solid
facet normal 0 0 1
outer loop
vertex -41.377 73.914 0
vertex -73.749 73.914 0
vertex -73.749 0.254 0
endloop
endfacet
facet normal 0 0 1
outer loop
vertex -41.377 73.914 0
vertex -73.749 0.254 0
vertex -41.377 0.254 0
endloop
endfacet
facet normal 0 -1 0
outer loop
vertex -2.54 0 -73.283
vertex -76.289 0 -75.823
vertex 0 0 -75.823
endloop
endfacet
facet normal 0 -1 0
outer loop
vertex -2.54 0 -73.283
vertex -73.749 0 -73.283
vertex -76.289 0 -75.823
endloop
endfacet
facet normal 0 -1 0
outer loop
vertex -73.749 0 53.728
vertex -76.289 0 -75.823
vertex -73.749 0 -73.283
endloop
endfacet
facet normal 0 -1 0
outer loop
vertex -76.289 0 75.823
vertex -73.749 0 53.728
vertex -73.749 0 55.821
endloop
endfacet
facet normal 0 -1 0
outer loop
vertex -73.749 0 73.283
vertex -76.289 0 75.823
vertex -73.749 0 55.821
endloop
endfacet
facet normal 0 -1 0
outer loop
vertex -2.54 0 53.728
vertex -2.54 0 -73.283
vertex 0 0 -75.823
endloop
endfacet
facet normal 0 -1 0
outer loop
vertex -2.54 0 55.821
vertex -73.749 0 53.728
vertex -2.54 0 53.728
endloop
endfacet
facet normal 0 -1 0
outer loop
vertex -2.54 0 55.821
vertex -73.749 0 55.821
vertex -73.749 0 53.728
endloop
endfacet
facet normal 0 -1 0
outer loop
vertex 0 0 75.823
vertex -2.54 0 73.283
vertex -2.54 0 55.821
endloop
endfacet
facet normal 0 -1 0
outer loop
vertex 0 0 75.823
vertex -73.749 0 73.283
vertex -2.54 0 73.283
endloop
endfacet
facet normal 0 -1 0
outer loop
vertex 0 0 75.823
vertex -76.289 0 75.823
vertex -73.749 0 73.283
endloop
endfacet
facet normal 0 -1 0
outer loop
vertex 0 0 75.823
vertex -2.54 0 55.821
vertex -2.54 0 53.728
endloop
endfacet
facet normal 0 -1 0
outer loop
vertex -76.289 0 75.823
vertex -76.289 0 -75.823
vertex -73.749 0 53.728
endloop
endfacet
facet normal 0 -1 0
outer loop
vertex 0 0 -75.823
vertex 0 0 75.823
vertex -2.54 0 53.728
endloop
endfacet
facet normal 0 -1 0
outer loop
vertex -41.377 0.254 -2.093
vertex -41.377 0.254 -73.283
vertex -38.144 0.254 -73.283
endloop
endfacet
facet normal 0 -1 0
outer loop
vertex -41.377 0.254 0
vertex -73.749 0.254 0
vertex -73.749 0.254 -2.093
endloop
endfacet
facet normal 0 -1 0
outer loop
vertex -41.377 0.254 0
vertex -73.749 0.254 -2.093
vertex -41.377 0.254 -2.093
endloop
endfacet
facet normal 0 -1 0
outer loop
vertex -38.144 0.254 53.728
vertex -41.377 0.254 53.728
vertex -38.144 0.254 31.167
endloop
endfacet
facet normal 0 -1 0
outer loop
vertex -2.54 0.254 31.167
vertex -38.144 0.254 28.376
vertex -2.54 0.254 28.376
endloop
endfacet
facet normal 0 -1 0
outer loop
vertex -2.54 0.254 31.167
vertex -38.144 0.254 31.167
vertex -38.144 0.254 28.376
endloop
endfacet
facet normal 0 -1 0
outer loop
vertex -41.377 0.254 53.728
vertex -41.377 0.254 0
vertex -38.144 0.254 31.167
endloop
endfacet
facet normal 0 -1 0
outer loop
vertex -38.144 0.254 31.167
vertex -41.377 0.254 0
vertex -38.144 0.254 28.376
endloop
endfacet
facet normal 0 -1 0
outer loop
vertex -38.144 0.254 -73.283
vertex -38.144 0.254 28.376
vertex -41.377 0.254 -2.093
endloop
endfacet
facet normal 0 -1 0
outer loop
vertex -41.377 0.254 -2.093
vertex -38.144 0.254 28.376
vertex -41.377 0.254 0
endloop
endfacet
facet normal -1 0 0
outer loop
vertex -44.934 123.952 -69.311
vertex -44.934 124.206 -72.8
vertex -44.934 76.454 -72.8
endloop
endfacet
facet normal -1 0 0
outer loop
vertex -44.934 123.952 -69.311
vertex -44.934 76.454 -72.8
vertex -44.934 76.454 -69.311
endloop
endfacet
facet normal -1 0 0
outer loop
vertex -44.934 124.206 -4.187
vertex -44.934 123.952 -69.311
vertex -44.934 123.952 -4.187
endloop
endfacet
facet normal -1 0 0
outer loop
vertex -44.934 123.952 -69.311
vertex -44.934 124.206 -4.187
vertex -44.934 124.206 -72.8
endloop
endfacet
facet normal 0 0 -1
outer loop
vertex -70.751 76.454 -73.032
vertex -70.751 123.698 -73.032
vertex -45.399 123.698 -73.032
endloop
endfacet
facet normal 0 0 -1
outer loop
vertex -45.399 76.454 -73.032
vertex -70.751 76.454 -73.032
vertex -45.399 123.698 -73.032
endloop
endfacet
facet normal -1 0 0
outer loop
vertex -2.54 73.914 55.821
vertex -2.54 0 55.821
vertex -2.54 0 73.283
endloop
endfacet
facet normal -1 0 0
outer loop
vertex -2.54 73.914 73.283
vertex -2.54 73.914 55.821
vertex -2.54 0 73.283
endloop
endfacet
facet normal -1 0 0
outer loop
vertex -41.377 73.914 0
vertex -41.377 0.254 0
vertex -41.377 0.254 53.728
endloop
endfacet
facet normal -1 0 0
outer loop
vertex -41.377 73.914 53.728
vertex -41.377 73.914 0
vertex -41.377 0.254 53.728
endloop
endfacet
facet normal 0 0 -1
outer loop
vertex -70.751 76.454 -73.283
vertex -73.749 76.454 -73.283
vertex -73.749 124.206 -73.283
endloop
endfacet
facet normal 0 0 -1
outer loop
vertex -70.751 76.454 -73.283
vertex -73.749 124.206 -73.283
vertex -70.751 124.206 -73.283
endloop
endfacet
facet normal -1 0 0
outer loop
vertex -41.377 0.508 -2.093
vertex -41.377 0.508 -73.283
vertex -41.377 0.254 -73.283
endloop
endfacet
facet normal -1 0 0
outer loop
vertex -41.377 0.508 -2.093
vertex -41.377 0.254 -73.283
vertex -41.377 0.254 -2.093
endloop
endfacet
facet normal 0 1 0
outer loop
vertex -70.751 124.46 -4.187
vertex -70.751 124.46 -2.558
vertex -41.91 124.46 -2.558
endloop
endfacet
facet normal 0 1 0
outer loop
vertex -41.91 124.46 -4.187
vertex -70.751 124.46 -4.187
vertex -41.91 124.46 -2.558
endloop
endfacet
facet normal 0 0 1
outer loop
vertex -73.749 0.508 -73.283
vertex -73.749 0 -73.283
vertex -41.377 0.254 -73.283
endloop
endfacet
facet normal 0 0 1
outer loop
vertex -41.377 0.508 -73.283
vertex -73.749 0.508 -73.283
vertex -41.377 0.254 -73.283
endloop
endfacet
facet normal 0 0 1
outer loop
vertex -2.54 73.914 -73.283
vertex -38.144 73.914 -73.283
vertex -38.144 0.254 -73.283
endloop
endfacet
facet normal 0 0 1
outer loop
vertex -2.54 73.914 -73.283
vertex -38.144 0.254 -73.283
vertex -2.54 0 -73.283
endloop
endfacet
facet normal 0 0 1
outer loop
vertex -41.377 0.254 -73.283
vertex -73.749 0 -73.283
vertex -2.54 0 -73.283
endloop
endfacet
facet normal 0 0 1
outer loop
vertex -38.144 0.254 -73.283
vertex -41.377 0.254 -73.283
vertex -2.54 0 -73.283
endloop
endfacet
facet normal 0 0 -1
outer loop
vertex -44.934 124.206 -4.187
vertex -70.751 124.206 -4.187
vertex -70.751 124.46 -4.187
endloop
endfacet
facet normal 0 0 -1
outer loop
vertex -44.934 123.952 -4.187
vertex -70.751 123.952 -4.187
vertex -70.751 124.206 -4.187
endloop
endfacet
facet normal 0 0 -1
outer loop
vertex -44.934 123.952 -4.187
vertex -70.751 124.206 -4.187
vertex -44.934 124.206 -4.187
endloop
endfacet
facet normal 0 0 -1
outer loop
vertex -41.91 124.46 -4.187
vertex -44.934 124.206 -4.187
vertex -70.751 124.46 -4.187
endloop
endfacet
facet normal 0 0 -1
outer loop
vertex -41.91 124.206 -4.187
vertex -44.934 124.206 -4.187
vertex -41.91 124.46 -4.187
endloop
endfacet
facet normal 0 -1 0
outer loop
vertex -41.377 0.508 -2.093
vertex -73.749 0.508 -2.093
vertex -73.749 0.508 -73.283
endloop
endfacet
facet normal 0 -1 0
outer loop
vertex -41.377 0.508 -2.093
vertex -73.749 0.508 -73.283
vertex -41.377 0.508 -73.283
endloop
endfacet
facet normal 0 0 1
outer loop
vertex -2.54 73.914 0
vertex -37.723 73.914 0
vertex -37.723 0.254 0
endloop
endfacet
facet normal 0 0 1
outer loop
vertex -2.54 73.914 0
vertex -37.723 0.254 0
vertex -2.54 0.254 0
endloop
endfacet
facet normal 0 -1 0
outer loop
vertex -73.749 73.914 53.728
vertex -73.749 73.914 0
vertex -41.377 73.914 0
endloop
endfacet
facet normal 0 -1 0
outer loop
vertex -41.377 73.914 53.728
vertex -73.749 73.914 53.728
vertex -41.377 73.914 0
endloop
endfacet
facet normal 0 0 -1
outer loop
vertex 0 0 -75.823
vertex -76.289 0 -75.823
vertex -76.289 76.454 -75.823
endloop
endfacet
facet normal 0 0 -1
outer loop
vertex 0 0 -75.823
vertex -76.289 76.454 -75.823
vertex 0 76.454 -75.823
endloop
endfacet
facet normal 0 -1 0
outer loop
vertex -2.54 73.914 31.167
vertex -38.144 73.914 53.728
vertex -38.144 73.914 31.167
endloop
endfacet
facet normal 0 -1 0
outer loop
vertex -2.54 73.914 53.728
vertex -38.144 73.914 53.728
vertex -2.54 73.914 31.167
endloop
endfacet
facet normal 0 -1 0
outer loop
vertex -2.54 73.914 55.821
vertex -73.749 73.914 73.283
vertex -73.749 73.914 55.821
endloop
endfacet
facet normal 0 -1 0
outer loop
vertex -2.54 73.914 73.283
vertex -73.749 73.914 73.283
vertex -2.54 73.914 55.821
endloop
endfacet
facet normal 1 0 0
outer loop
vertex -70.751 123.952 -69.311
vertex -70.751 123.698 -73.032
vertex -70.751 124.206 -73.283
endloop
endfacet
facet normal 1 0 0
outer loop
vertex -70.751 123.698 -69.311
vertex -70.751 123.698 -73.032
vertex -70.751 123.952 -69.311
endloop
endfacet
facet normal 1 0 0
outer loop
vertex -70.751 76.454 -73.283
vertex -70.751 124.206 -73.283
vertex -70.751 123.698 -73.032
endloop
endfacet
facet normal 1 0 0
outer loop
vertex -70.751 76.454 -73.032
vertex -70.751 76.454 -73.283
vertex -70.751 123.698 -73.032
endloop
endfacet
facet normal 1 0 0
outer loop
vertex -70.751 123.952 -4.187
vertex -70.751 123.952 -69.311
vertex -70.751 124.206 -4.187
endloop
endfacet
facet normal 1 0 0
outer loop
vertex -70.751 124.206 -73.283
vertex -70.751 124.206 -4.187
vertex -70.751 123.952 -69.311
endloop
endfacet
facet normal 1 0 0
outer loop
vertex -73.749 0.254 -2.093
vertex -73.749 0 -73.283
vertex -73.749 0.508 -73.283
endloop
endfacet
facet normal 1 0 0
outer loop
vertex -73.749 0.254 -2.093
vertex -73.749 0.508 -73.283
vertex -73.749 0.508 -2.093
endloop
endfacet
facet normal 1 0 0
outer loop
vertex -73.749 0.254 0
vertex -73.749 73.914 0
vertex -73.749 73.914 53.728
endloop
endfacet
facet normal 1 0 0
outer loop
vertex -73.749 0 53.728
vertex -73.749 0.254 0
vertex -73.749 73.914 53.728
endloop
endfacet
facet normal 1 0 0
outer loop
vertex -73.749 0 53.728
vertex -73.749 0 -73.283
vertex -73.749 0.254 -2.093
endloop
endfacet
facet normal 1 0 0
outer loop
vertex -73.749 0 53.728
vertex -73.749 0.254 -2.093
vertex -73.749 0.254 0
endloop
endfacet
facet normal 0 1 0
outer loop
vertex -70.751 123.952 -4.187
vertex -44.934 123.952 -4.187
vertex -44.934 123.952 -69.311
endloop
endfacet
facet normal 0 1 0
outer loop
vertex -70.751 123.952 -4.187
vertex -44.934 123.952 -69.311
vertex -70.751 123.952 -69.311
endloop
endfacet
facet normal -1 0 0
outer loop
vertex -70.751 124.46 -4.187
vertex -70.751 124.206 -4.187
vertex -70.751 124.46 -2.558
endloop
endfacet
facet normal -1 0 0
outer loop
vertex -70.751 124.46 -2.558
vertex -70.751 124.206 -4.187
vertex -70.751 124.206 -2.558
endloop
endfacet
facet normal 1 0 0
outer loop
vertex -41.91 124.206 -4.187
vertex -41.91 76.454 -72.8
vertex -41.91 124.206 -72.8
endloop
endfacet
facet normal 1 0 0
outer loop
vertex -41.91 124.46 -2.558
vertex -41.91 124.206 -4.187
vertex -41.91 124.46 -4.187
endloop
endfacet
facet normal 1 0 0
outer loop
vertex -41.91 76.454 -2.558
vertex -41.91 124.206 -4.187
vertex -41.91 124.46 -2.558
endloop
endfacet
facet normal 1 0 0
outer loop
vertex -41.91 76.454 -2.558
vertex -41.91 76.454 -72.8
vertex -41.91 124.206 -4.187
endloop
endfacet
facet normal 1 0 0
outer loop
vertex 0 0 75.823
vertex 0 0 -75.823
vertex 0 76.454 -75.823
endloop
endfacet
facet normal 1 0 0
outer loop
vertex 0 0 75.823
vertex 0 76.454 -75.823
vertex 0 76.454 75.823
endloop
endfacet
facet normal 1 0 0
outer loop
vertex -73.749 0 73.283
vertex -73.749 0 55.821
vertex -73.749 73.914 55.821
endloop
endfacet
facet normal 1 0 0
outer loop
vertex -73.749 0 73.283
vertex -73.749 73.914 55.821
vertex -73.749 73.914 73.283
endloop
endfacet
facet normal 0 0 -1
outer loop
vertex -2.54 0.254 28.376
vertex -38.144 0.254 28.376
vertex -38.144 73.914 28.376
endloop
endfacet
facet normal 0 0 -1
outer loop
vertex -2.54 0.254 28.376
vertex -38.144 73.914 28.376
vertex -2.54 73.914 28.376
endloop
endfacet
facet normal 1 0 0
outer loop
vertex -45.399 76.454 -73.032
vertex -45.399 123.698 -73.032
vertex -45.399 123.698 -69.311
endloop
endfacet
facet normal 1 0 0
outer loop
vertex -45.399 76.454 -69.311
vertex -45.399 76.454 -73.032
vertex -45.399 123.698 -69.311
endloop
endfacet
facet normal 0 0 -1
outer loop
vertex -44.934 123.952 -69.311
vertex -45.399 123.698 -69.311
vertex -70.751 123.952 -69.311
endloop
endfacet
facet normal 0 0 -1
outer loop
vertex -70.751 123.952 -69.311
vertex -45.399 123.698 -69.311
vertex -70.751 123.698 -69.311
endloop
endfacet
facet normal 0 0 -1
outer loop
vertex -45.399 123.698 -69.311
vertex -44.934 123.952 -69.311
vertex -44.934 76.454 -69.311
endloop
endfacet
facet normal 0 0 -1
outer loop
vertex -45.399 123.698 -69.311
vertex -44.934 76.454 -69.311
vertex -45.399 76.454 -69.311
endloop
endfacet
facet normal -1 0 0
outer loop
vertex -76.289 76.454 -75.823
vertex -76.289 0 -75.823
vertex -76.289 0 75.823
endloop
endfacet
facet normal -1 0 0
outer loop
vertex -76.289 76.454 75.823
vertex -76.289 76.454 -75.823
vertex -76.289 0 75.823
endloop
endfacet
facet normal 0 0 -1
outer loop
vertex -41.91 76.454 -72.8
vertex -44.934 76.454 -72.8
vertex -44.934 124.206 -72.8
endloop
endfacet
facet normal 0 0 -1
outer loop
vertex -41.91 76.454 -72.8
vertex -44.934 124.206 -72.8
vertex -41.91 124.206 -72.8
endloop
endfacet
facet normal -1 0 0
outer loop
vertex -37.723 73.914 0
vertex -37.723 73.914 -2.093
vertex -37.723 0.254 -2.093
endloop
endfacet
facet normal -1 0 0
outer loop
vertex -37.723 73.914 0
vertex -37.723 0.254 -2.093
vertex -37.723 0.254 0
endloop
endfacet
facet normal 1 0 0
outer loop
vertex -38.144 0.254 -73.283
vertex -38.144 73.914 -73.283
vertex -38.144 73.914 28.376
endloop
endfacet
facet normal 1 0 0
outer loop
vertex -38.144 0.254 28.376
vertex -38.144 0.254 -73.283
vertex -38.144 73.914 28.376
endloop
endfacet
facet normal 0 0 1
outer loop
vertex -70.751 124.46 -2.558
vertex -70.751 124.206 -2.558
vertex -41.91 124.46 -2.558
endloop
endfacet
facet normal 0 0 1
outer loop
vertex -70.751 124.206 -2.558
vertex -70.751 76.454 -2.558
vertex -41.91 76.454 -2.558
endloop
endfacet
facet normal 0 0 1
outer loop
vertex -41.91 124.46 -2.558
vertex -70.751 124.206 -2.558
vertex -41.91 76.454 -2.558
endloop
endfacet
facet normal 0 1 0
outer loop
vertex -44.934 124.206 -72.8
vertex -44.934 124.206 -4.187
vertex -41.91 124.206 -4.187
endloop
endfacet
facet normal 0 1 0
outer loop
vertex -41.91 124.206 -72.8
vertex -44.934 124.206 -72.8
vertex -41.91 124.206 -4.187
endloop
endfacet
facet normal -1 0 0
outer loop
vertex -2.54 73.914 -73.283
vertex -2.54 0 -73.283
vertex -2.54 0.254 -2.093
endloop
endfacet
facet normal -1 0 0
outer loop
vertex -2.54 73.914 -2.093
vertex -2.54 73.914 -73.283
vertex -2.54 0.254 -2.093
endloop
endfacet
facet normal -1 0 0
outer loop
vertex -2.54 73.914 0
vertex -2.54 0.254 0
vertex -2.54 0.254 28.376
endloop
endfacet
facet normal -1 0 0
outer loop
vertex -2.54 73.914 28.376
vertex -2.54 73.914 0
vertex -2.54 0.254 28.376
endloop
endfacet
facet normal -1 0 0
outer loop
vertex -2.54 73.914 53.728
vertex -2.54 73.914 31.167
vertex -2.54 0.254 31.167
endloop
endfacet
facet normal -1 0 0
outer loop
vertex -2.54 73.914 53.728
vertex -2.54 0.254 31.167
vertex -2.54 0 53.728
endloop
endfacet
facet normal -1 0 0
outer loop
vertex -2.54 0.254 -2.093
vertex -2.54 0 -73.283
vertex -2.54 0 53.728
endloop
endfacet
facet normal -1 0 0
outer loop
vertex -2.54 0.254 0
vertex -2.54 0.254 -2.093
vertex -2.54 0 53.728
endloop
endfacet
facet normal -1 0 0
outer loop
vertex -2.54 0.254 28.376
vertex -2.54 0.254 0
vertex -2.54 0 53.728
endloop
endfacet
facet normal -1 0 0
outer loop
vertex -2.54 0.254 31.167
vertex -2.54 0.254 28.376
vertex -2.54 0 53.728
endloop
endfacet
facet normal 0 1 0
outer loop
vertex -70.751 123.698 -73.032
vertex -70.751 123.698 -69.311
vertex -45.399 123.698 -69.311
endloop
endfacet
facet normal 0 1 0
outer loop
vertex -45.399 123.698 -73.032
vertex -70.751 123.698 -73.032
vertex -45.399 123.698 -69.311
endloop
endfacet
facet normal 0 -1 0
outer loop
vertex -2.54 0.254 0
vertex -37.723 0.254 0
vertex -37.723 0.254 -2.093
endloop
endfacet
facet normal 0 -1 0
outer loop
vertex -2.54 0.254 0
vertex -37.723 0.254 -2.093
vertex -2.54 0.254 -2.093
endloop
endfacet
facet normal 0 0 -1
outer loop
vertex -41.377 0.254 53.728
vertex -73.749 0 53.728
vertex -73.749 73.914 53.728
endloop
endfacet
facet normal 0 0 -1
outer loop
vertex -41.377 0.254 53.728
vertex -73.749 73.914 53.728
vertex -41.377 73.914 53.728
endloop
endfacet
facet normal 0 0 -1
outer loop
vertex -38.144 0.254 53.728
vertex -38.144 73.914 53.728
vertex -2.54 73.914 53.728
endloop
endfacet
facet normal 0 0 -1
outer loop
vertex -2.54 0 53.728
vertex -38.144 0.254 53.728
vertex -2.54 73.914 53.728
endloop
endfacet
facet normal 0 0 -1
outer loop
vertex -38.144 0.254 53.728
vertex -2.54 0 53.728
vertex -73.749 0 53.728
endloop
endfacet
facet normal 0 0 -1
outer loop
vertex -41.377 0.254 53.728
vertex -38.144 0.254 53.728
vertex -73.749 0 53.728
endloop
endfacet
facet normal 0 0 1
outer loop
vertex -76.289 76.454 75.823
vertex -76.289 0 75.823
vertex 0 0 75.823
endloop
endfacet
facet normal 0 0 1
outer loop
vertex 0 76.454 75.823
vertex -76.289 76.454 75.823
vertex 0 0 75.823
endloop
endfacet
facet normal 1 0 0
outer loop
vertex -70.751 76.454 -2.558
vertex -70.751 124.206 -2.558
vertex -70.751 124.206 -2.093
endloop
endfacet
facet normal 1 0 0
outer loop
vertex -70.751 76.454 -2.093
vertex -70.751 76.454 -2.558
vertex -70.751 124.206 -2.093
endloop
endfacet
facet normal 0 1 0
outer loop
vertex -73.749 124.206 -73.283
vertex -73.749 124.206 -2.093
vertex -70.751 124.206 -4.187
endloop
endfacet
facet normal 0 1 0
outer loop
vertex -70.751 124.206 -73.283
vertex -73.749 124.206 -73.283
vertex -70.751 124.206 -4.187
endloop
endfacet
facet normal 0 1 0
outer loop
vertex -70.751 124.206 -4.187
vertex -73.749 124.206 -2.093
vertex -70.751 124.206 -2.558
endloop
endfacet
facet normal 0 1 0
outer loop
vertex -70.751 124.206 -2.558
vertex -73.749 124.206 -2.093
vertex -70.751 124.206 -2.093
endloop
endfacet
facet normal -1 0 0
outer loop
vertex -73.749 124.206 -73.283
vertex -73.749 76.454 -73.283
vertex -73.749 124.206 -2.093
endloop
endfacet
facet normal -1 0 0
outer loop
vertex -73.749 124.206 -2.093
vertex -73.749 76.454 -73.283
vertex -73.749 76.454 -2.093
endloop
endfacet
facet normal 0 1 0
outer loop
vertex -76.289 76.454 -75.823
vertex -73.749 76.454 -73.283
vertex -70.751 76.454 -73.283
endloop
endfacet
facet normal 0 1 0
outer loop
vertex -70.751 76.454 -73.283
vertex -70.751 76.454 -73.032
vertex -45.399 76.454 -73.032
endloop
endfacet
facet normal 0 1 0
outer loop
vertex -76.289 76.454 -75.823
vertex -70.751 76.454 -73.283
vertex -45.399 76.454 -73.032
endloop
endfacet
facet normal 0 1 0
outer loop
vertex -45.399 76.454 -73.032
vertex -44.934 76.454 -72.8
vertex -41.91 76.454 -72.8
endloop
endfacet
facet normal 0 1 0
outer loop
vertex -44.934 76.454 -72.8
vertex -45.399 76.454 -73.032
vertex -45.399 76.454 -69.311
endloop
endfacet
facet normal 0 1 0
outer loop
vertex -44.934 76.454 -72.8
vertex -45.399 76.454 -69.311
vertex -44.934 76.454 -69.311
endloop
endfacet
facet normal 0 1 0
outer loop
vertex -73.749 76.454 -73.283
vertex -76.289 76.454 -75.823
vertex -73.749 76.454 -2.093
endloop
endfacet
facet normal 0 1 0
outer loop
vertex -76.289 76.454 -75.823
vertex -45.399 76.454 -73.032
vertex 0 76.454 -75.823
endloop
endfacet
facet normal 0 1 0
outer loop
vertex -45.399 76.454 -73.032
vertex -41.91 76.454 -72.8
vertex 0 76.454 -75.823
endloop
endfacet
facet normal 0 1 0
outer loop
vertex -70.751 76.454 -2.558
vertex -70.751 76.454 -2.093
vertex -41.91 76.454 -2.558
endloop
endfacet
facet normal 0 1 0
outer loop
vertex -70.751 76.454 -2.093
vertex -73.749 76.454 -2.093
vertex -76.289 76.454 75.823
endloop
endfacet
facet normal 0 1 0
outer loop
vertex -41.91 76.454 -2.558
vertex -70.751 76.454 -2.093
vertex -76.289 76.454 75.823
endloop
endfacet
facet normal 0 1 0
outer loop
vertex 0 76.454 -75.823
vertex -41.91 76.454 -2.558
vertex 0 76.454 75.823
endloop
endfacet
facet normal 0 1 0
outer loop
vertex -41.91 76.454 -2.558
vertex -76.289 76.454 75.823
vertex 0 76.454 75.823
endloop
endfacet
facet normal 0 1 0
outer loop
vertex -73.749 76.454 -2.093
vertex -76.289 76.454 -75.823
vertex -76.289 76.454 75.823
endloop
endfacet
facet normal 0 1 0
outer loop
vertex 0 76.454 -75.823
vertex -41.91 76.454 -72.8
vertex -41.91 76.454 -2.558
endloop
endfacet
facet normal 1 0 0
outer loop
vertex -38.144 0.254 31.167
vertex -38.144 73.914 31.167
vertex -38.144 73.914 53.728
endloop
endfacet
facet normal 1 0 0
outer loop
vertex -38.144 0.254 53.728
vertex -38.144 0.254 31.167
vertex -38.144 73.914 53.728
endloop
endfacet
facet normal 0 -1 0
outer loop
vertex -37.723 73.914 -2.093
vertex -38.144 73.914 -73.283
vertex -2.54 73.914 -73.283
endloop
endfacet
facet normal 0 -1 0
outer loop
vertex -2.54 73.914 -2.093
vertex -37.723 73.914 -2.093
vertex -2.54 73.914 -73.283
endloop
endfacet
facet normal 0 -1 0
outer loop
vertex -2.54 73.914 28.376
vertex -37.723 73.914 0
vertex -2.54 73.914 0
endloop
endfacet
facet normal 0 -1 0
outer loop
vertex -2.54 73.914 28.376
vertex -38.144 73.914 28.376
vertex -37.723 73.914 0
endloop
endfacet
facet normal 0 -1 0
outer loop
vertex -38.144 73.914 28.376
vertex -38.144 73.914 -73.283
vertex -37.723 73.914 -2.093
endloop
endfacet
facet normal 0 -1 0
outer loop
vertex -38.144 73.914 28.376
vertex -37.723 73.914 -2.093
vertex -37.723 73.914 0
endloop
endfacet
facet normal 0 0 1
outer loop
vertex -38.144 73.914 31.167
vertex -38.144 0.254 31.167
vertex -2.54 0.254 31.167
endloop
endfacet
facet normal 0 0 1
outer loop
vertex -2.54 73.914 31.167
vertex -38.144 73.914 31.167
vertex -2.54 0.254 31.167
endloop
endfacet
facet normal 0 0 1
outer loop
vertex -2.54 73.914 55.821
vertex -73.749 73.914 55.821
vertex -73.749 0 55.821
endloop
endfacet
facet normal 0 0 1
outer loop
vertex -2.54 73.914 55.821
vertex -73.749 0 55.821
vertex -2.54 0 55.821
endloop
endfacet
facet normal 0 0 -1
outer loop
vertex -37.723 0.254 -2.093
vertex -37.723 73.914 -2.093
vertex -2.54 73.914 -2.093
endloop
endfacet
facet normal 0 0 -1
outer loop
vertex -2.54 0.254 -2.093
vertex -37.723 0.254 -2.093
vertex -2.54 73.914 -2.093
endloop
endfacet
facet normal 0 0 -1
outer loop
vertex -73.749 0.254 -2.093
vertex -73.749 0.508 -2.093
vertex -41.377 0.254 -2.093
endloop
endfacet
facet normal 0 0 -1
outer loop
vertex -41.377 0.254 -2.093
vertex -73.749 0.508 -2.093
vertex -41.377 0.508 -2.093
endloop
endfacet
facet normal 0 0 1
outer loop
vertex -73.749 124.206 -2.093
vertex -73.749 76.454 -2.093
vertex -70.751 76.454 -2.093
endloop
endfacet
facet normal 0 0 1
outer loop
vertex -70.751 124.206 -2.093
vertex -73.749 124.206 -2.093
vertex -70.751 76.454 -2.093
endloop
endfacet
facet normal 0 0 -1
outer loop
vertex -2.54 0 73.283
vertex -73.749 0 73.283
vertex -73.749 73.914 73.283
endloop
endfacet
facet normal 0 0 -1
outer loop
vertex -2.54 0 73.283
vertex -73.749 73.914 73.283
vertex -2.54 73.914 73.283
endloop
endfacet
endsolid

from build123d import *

# Parameters (mm, degrees)
F0_W      = 76.2886032462
F0_H      = 151.6468524933
F1_DEPTH  = 76.454
F2_T      = -2.54
F3_W      = 71.2086032462
F3_H      = 2.0932815969
F4_DEPTH  = 73.914
F5_W      = 3.2325349748
F5_H      = 127.0110753989
F6_DEPTH  = 73.66
F7_W      = 32.3717666483
F7_H      = 2.0932848565
F8_DEPTH  = 73.66
F10_W     = 35.353255691
F10_H     = 2.0932848565
F11_DEPTH = 73.66
F9_W      = 35.6043016231
F9_H      = 2.7910489589
F12_DEPTH = 73.66
F16_W     = 25.3520011902
F16_H     = 3.7214010954
F17_DEPTH = 49.784
F15_W     = 3.0236318707
F15_H     = 68.8458192162
F18_DEPTH = 50.292
F14_W     = 28.8408100605
F14_H     = 1.6281104181
F19_DEPTH = 50.546
F13_W     = 2.9977930403
F13_H     = 71.1901413901
F20_DEPTH = 50.292
F22_DEPTH = 47.498
F23_DEPTH = 73.406


with BuildPart() as f1:
    # F0 (on Front) → F1 (new body)
    with BuildSketch(Plane.XZ):
        with Locations((-38.1443016231, 0)):
            Rectangle(F0_W, F0_H)
    extrude(amount=-F1_DEPTH)

    # F2
    f2_openings = [f1.faces().sort_by_distance(p)[0] for p in [
        (-38.144302, 0, 0),
    ]]
    offset(amount=F2_T, openings=f2_openings)

    # F3 (on face) → F4 (join)
    with BuildSketch(Plane.XZ.offset(-73.914)):
        with Locations((-38.1443016231, 54.7742899507)):
            Rectangle(F3_W, F3_H)
    extrude(amount=F4_DEPTH)

    # F5 (on face) → F6 (join)
    with BuildSketch(Plane.XZ.offset(-73.914)):
        with Locations((-39.7605691105, -9.7778885472)):
            Rectangle(F5_W, F5_H)
    extrude(amount=F6_DEPTH)

    # F7 (on face) → F8 (join)
    with BuildSketch(Plane.XZ.offset(-73.914)):
        with Locations((-57.5627199221, -1.0466424283)):
            Rectangle(F7_W, F7_H)
    extrude(amount=F8_DEPTH)

    # F10 (on face) → F11 (join)
    with BuildSketch(Plane.XZ.offset(-73.914)):
        with Locations((-20.0468016556, -1.0466424283)):
            Rectangle(F10_W, F10_H)
    extrude(amount=F11_DEPTH)

    # F9 (on face) → F12 (join)
    with BuildSketch(Plane.XZ.offset(-73.914)):
        with Locations((-20.3421508116, 29.7711631283)):
            Rectangle(F9_W, F9_H)
    extrude(amount=F12_DEPTH)

    # F16 (on face) → F17 (join)
    with BuildSketch(Plane.XZ.offset(-73.914)):
        with Locations((-58.0748096108, -71.1716860533)):
            Rectangle(F16_W, F16_H)
    extrude(amount=-F17_DEPTH)

    # F15 (on face) → F18 (join)
    with BuildSketch(Plane.XZ.offset(-73.914)):
        with Locations((-43.4218160808, -38.3768922184)):
            Rectangle(F15_W, F15_H)
    extrude(amount=-F18_DEPTH)

    # F14 (on face) → F19 (join)
    with BuildSketch(Plane.XZ.offset(-73.914)):
        with Locations((-56.3304051757, -3.372514504)):
            Rectangle(F14_W, F14_H)
    extrude(amount=-F19_DEPTH)

    # F13 (on face) → F20 (join)
    with BuildSketch(Plane.XZ.offset(-73.914)):
        with Locations((-72.2497067261, -37.6883555516)):
            Rectangle(F13_W, F13_H)
    extrude(amount=-F20_DEPTH)

    # F21 (on face) → F22 (join)
    with BuildSketch(Plane(origin=(0, 76.454, 0), x_dir=(-1, 0, 0), z_dir=(0, 1, 0))):
        Polygon((70.7508102059, -4.1865697131), (44.9336320162, -4.1865697131), (44.9336320162, -69.3109855056), (45.3988090158, -69.3109855056), (70.7508102059, -69.3109855056), align=None)
    extrude(amount=F22_DEPTH)

    # F23 (add): a face of the model
    f23_faces = [f1.faces().sort_by_distance(p)[0] for p in [
        (-57.5627199221, 73.914, -37.6883555516),
    ]]
    extrude(f23_faces, amount=F23_DEPTH)


solid = f1.part
